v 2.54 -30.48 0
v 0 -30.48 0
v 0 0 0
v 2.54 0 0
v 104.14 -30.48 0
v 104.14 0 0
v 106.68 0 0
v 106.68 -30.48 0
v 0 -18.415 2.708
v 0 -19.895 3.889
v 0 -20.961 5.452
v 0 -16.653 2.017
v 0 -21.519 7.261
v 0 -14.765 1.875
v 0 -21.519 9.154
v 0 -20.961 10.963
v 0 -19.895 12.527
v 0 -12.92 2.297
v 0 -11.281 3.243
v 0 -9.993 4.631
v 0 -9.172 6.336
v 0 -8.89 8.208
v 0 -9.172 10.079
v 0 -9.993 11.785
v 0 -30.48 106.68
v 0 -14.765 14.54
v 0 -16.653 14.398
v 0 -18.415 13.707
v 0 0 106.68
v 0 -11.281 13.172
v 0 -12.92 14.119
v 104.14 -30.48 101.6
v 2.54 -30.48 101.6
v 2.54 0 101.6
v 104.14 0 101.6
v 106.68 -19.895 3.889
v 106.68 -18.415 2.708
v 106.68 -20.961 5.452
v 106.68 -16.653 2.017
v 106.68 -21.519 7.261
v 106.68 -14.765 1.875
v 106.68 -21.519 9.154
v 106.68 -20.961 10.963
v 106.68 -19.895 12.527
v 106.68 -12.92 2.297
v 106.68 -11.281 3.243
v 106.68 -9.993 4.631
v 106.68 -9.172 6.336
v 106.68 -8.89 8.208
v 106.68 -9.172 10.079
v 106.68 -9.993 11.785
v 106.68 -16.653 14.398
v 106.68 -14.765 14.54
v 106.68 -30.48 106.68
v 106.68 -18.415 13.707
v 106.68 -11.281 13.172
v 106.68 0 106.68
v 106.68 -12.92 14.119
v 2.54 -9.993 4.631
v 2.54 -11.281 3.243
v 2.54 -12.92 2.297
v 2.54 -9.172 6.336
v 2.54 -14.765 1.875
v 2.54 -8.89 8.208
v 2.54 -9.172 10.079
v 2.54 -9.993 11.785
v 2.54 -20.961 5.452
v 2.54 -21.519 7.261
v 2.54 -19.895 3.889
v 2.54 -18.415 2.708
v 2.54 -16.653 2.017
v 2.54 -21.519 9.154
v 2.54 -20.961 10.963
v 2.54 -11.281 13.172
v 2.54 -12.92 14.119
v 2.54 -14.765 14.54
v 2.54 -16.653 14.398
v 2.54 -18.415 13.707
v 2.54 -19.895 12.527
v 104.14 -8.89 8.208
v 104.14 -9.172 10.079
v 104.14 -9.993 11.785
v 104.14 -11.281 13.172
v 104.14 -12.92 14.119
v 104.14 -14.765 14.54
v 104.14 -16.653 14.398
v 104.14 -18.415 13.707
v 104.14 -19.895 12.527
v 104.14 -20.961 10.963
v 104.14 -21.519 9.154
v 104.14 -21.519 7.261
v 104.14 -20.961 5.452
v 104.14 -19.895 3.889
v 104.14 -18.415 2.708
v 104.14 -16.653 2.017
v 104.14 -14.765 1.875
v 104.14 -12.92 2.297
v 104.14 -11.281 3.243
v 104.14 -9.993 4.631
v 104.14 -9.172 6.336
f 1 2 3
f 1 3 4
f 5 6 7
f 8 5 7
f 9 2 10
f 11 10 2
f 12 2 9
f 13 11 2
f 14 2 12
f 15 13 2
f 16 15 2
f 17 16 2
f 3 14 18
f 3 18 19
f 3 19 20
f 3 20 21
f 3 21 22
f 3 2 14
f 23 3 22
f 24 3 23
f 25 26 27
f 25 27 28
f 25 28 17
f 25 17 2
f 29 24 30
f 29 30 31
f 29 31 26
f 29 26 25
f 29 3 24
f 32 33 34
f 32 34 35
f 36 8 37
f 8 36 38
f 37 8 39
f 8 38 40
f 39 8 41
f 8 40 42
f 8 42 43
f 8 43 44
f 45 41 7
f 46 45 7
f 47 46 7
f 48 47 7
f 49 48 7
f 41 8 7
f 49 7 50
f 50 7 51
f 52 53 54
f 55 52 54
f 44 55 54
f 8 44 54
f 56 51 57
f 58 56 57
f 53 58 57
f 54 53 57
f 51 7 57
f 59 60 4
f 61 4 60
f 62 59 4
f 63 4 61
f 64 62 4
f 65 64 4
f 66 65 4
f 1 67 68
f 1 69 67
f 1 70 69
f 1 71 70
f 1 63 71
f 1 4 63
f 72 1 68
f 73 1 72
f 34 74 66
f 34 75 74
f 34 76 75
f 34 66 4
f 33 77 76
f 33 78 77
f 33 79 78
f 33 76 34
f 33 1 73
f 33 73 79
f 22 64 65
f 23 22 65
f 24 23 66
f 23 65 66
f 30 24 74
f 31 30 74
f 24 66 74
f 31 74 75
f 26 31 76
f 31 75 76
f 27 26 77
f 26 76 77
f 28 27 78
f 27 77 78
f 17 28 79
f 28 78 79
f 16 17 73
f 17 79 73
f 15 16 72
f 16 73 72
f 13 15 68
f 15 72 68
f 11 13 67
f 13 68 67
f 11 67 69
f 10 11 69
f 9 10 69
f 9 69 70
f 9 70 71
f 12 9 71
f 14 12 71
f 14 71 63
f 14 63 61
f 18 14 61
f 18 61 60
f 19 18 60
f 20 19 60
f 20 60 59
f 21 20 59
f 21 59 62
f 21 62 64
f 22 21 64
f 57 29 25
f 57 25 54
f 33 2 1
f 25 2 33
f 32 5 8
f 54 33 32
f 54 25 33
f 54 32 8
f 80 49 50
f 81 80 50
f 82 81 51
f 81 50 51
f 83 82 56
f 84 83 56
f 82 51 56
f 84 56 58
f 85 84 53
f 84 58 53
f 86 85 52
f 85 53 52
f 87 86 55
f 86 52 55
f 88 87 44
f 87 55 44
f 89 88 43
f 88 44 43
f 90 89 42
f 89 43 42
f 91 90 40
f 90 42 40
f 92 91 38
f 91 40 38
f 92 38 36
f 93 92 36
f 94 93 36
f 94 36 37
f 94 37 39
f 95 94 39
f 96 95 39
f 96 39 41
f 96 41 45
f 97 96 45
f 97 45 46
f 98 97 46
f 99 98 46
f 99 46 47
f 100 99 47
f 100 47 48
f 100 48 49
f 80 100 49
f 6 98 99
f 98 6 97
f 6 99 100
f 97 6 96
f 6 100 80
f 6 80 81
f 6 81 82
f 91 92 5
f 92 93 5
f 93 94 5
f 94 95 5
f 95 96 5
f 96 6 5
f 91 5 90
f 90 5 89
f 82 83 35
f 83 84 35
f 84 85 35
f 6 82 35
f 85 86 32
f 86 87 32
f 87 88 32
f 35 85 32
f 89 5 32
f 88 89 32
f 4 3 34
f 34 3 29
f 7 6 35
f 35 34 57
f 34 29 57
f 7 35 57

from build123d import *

# Parameters (mm, degrees)
F0_W     = 106.68
F0_H     = 106.68
F1_DEPTH = 30.48
F2_W     = 101.6
F2_H     = 101.6
F3_DEPTH = 30.48
F4_R     = 6.35
F5_DEPTH = 106.68


with BuildPart() as f1:
    # F0 (on Front) → F1 (new body)
    with BuildSketch(Plane.XZ):
        with Locations((53.34, 53.34)):
            Rectangle(F0_W, F0_H)
    extrude(amount=F1_DEPTH)

    # F2 (on face) → F3 (cut)
    with BuildSketch(Plane.XZ.offset(30.48)):
        with Locations((53.34, 50.8)):
            Rectangle(F2_W, F2_H)
    extrude(amount=-F3_DEPTH, mode=Mode.SUBTRACT)

    # F4 (on face) → F5 (cut)
    with BuildSketch(Plane.YZ.offset(106.68)):
        with Locations((-15.24, 8.207626)):
            Circle(F4_R)
    extrude(amount=-F5_DEPTH, mode=Mode.SUBTRACT)


solid = f1.part
